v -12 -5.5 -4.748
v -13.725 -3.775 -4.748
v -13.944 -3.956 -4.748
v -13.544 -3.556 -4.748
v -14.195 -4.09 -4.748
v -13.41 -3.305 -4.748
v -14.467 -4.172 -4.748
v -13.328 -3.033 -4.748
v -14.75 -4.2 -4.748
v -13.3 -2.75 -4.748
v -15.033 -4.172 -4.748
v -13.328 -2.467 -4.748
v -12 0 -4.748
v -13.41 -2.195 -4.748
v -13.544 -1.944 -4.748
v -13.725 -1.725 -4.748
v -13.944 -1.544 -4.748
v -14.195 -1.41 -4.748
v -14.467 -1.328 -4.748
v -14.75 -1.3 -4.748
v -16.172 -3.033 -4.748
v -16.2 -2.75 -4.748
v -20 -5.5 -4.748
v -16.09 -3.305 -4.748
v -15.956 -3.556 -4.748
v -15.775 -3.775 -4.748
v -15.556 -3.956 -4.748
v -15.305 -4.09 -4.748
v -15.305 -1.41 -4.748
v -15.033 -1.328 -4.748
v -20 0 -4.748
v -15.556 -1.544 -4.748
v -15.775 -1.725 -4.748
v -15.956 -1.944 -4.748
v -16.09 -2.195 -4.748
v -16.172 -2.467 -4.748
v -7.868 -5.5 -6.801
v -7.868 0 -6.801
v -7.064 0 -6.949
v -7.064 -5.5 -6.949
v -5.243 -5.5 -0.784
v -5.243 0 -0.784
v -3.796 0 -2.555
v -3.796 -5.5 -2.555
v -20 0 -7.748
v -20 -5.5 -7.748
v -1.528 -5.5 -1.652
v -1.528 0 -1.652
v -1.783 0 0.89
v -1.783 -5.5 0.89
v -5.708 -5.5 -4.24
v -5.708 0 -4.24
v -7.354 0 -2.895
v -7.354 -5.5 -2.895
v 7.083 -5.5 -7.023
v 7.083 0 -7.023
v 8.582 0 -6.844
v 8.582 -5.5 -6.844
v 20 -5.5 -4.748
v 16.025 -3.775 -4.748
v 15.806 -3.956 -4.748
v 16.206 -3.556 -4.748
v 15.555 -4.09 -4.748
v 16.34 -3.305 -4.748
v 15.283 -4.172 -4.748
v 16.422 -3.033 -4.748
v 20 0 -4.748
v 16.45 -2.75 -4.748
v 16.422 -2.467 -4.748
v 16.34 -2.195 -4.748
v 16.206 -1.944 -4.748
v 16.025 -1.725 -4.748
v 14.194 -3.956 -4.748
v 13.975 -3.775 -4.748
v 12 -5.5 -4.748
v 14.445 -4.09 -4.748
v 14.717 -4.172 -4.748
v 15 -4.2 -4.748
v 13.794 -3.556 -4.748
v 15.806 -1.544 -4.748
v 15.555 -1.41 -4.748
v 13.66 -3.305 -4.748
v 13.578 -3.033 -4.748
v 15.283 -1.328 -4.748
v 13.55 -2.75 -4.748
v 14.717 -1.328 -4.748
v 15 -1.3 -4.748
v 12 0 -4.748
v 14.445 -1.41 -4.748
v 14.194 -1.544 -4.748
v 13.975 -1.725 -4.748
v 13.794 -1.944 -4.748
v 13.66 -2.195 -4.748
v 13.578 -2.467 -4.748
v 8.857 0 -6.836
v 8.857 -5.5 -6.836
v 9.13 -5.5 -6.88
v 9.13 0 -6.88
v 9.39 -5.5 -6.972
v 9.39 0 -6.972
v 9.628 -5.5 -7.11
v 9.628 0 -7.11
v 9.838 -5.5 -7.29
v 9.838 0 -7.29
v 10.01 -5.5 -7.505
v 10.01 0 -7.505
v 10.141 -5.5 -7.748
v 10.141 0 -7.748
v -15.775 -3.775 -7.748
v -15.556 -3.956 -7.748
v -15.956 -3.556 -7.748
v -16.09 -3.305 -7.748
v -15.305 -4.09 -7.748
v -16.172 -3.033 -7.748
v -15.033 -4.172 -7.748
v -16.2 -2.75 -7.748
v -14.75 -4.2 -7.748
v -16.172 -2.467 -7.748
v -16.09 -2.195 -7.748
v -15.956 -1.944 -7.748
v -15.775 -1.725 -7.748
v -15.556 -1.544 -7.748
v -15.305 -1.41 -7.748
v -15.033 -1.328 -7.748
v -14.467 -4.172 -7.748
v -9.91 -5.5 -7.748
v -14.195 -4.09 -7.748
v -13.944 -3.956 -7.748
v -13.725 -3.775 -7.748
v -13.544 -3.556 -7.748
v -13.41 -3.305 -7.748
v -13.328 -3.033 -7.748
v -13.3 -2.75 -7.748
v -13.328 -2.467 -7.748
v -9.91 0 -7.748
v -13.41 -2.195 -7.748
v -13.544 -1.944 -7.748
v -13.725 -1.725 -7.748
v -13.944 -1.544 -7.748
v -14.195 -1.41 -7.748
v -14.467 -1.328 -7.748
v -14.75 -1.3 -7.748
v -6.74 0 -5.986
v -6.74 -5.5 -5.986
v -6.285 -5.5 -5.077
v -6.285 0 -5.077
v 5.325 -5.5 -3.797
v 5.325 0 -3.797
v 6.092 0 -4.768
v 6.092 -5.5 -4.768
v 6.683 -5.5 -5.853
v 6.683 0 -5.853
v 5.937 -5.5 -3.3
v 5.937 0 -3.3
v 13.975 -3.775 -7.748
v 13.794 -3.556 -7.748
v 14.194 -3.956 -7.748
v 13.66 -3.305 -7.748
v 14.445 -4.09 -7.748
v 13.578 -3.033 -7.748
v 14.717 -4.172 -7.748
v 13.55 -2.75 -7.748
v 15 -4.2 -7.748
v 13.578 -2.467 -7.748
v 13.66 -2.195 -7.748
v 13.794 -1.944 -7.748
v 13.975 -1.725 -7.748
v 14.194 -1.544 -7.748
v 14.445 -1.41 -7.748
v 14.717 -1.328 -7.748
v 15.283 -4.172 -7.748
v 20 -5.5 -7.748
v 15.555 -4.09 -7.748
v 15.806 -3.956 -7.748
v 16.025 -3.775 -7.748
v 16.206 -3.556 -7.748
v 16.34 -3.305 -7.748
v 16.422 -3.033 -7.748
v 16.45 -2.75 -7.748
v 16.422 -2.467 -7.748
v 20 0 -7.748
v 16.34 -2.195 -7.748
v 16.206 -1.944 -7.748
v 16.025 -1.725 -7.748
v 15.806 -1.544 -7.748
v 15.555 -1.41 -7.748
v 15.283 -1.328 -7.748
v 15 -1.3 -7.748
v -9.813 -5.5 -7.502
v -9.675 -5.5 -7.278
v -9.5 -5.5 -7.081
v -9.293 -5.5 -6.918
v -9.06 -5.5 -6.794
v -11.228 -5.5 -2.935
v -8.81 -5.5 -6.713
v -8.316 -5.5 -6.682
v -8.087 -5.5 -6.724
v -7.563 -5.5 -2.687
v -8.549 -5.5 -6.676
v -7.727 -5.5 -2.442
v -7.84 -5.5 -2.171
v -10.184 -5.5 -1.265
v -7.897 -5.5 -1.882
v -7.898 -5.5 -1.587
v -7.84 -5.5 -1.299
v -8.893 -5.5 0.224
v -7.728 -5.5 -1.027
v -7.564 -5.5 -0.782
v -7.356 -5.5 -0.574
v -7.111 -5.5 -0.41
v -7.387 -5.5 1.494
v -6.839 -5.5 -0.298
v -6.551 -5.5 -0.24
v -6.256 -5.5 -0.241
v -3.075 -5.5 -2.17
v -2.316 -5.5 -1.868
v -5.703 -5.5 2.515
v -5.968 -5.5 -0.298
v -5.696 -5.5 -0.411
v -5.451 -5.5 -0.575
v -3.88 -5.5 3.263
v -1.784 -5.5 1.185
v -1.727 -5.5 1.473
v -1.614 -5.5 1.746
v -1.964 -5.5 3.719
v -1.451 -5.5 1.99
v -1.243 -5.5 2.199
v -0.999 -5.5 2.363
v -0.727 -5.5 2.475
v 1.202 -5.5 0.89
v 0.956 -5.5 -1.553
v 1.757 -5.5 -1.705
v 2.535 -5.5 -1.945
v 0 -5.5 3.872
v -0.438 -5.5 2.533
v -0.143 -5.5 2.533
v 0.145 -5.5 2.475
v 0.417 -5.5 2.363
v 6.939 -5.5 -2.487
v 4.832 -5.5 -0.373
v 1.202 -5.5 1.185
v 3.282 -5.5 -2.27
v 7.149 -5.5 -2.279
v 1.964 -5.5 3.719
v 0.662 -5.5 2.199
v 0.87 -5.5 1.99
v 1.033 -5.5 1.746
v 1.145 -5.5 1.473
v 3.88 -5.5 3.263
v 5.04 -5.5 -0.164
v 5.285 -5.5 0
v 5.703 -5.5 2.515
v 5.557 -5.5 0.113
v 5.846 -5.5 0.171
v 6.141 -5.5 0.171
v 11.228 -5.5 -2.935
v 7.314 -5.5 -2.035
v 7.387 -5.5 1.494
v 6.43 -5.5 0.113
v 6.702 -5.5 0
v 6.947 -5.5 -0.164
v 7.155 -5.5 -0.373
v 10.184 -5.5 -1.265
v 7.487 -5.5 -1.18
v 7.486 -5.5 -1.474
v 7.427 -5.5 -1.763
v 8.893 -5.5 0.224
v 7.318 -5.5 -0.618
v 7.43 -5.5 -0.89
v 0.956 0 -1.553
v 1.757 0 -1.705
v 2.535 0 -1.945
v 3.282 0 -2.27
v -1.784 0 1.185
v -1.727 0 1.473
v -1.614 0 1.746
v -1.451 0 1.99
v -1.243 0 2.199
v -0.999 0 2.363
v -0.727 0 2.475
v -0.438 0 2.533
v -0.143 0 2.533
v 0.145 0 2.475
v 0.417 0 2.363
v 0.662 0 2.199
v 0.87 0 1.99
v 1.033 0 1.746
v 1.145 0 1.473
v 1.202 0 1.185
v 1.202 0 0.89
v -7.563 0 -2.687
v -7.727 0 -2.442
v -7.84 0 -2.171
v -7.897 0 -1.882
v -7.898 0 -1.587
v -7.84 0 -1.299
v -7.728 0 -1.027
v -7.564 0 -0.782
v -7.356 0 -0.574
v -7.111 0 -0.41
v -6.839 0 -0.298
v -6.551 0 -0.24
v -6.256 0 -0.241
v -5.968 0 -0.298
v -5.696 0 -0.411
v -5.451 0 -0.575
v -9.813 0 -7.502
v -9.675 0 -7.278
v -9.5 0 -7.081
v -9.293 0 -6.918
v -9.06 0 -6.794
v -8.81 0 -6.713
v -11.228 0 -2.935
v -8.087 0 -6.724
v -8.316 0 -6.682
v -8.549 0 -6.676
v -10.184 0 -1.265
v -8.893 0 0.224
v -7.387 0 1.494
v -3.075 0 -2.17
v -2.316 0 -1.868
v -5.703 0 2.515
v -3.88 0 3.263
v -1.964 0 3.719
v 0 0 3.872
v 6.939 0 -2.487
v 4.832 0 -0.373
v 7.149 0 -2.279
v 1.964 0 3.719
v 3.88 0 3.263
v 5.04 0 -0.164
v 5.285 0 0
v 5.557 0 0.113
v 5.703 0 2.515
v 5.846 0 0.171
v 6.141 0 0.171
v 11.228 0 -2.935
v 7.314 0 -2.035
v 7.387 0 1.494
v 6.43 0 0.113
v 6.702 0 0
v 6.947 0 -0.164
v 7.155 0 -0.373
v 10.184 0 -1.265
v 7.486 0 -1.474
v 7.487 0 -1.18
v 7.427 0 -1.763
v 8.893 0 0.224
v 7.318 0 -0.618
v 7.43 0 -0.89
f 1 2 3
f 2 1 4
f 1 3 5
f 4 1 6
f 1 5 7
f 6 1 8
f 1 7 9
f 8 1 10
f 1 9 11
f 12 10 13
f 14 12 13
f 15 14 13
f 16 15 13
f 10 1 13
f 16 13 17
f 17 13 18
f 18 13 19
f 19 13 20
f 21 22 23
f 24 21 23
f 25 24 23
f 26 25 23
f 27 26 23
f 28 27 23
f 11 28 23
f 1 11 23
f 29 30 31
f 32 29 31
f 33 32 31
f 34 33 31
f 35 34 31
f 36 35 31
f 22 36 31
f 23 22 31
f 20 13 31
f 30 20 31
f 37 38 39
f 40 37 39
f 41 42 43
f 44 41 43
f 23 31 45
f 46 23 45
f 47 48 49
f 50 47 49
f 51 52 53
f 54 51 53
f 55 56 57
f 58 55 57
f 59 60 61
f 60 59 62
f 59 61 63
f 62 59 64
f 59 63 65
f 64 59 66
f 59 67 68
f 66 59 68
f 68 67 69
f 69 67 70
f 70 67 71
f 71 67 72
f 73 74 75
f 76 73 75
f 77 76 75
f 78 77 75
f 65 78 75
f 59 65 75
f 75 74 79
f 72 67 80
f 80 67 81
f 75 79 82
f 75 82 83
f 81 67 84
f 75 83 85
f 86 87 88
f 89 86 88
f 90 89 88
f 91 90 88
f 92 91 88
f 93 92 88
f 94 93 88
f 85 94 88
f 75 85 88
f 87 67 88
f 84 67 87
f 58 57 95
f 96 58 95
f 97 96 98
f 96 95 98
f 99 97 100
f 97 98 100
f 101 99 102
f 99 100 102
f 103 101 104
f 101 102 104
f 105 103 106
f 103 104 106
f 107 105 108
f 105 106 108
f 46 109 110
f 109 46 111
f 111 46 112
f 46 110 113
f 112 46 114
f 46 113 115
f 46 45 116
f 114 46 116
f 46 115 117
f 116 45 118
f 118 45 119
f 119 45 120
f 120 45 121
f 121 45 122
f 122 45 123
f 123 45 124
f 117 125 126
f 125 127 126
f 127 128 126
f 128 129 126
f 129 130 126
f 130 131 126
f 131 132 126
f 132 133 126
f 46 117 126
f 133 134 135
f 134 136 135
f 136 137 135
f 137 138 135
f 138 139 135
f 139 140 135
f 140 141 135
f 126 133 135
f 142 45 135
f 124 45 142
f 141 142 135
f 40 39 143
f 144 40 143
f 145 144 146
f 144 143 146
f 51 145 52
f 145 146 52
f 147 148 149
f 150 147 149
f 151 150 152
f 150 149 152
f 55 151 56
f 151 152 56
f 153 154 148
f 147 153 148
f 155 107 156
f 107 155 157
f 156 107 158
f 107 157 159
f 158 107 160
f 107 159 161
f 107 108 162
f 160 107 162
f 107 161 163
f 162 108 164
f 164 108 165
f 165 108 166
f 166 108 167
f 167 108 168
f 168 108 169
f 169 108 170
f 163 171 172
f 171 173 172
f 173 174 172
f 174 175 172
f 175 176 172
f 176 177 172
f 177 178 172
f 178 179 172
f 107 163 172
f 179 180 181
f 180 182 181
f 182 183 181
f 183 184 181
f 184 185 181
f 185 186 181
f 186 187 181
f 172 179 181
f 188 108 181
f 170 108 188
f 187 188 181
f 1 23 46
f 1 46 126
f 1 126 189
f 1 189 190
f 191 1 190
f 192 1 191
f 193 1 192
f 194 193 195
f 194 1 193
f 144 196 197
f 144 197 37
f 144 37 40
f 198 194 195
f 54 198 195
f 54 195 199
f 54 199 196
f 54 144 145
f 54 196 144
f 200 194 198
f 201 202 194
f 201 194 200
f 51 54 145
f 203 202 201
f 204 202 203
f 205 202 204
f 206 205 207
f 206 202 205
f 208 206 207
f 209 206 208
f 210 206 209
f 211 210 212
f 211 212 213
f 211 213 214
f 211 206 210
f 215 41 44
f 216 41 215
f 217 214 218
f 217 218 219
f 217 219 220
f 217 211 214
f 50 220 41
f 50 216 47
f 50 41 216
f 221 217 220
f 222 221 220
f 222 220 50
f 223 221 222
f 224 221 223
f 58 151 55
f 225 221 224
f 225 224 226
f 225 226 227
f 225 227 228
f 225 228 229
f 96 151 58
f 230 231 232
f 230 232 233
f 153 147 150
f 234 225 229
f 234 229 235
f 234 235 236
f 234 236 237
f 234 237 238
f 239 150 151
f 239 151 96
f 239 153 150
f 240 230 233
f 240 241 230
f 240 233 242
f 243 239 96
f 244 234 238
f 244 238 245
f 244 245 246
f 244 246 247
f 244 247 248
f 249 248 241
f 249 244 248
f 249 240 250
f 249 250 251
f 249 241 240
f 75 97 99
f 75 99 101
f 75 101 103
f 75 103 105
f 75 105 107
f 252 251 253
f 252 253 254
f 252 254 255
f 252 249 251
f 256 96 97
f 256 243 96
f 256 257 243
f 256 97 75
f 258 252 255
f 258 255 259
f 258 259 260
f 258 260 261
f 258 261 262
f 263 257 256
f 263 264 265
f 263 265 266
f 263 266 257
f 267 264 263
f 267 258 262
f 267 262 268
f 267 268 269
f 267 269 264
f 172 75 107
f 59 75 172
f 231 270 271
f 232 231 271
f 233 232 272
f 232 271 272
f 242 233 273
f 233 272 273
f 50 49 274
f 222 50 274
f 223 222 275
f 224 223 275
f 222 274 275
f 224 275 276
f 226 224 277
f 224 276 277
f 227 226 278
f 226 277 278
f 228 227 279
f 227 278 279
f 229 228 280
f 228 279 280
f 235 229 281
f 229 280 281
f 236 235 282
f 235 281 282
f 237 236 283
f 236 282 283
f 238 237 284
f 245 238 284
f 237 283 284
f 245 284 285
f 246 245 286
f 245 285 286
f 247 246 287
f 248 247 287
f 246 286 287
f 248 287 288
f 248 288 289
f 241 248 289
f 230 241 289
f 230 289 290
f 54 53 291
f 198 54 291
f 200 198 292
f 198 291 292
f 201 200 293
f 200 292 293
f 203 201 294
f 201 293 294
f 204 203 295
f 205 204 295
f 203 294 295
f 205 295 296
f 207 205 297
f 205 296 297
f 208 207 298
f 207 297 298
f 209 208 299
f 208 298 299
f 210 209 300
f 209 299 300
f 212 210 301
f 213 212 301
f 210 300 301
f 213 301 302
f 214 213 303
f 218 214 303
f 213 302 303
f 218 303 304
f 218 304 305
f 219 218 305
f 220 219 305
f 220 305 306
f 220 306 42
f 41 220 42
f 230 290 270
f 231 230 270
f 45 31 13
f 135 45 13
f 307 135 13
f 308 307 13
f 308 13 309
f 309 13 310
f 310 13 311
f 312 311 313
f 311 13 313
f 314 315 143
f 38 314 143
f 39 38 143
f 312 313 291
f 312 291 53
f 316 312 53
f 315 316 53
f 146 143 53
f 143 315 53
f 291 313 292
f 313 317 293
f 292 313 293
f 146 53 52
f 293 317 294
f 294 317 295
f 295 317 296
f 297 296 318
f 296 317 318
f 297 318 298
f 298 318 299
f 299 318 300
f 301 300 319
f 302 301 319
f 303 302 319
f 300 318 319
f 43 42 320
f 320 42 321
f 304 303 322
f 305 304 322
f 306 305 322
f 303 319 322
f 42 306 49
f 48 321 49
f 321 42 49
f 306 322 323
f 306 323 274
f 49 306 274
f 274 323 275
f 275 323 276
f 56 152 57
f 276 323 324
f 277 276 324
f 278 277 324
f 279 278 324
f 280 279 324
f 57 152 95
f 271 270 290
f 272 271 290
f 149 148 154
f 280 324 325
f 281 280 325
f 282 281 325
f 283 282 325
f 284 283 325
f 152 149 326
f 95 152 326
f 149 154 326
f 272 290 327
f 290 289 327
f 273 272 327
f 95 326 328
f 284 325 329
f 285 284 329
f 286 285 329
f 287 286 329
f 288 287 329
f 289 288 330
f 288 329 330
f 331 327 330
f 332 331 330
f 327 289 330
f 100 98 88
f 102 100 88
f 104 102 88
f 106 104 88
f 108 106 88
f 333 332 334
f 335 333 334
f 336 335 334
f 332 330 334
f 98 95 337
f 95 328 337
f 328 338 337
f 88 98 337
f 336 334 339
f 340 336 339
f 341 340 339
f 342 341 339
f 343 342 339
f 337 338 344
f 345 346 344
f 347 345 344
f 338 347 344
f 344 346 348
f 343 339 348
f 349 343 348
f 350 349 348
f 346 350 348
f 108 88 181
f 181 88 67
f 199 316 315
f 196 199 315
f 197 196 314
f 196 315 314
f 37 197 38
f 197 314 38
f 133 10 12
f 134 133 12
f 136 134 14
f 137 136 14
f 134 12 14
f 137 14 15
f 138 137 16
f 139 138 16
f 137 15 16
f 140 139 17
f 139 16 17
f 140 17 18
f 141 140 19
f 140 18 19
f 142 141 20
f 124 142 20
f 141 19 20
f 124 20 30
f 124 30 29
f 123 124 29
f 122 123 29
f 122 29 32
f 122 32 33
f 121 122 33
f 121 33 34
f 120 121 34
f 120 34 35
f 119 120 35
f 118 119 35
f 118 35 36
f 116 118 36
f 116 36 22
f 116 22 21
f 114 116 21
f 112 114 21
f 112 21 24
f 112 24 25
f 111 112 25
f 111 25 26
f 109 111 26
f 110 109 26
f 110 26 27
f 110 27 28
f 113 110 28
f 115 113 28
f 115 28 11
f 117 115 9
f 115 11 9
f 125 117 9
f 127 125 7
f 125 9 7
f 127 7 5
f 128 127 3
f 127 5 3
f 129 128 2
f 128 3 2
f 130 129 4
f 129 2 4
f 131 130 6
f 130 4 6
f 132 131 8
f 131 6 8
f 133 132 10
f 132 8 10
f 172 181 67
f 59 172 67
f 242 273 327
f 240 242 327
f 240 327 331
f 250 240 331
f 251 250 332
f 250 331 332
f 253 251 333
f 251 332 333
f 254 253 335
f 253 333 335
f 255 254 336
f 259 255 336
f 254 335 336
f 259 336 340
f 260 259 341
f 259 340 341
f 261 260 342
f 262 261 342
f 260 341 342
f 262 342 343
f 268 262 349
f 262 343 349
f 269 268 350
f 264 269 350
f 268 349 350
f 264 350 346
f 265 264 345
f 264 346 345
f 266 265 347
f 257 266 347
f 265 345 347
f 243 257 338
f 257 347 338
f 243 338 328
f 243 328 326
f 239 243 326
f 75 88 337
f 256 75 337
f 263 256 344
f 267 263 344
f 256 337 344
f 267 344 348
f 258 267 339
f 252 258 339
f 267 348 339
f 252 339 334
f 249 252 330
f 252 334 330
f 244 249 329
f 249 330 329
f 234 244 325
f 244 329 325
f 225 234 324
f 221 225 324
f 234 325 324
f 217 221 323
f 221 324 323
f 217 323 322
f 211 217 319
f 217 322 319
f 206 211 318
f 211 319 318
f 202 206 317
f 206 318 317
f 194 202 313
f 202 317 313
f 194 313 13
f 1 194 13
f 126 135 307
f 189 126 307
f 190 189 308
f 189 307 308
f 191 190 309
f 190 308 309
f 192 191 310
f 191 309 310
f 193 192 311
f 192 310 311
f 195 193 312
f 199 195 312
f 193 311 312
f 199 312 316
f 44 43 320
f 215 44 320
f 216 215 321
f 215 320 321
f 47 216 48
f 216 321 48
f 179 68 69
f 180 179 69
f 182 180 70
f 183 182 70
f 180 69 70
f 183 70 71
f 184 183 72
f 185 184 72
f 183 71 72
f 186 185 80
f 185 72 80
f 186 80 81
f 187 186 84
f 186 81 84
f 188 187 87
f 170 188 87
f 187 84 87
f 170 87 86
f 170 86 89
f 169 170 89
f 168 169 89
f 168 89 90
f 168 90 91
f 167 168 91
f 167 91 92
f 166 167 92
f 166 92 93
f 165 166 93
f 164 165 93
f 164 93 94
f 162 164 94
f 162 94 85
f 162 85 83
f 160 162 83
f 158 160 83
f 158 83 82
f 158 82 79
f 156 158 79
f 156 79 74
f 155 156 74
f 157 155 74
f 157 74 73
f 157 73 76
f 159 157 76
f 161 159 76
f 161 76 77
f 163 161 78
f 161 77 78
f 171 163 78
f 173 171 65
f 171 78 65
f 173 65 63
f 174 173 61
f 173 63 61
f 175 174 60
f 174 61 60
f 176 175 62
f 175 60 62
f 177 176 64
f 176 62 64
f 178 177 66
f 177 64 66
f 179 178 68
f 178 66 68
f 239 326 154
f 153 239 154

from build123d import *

# Parameters (mm, degrees)
F1_DEPTH = 5.5
F2_R     = 1.45
F3_DEPTH = 25
F4_R     = 1.45
F5_DEPTH = 25


# Not quite as in the source:
# - a feature names something its author has since deleted; it is built from what else it names


with BuildPart() as f1:
    # F0 (on Front) → F1 (new body)
    with BuildSketch(Plane.XZ):
        with BuildLine():
            Line((10.1409122915, -7.7475719752), (20, -7.7475719752))
            Line((20, -7.7475719752), (20, -4.7475719752))
            Line((20, -4.7475719752), (12, -4.7475719752))
            ThreePointArc((12, -4.7475719752), (0, 3.8721859892), (-12, -4.7475719752))
            Line((-12, -4.7475719752), (-20, -4.7475719752))
            Line((-20, -4.7475719752), (-20, -7.7475719752))
            Line((-20, -7.7475719752), (-10, -7.7475719752))
            Line((-10, -7.7475719752), (-9.9101597832, -7.7475719752))
            ThreePointArc((-9.9101597832, -7.7475719752), (-9.399666092, -6.9954026392), (-8.5485111922, -6.6761882044))
            ThreePointArc((-8.5485111922, -6.6761882044), (-8.20089019, -6.698967849), (-7.8678987383, -6.8013200176))
            Line((-7.8678987383, -6.8013200176), (-7.0639233089, -6.9491323338))
            ThreePointArc((-7.0639233089, -6.9491323338), (-6.5280807154, -5.5234621099), (-5.7080769948, -4.2400070969))
            Line((-5.7080769948, -4.2400070969), (-7.3540770708, -2.8946497535))
            ThreePointArc((-7.3540770708, -2.8946497535), (-7.4654597138, -0.6725800185), (-5.2433899789, -0.7839626615))
            Line((-5.2433899789, -0.7839626615), (-3.7957894574, -2.5550538739))
            ThreePointArc((-3.7957894574, -2.5550538739), (-2.6997185699, -2.0081537307), (-1.5276324855, -1.6522248506))
            Line((-1.5276324855, -1.6522248506), (-1.7831469906, 0.8901123752))
            ThreePointArc((-1.7831469906, 0.8901123752), (-0.2906658349, 2.5401123752), (1.2018153207, 0.8901123752))
            Line((1.2018153207, 0.8901123752), (0.9562236033, -1.55349436))
            ThreePointArc((0.9562236033, -1.55349436), (2.1490849475, -1.8141042253), (3.281823707, -2.2698877168))
            Line((3.281823707, -2.2698877168), (4.832326413, -0.3728990956))
            ThreePointArc((4.832326413, -0.3728990956), (7.0560350494, -0.2631578905), (6.9394170389, -2.4865164921))
            Line((6.9394170389, -2.4865164921), (5.9372443956, -3.3004847472))
            Line((5.9372443956, -3.3004847472), (5.3253136848, -3.7974970895))
            ThreePointArc((5.3253136848, -3.7974970895), (6.4103242472, -5.2980690002), (7.0828602188, -7.0233687847))
            Line((7.0828602188, -7.0233687847), (8.5816167977, -6.8438853729))
            ThreePointArc((8.5816167977, -6.8438853729), (9.5121128892, -7.0354424826), (10.1409122915, -7.7475719752))
        make_face()
    extrude(amount=F1_DEPTH)

    # F2 (on face) → F3 (cut)
    with BuildSketch(Plane.XY.offset(-4.7475719752)):
        with Locations((-14.75, -2.75)):
            Circle(F2_R)
    extrude(amount=-F3_DEPTH, mode=Mode.SUBTRACT)

    # F4 (on face) → F5 (cut)
    with BuildSketch(Plane.XY.offset(-4.7475719752)):
        with Locations((15, -2.75)):
            Circle(F4_R)
    extrude(amount=-F5_DEPTH, mode=Mode.SUBTRACT)


solid = f1.part
